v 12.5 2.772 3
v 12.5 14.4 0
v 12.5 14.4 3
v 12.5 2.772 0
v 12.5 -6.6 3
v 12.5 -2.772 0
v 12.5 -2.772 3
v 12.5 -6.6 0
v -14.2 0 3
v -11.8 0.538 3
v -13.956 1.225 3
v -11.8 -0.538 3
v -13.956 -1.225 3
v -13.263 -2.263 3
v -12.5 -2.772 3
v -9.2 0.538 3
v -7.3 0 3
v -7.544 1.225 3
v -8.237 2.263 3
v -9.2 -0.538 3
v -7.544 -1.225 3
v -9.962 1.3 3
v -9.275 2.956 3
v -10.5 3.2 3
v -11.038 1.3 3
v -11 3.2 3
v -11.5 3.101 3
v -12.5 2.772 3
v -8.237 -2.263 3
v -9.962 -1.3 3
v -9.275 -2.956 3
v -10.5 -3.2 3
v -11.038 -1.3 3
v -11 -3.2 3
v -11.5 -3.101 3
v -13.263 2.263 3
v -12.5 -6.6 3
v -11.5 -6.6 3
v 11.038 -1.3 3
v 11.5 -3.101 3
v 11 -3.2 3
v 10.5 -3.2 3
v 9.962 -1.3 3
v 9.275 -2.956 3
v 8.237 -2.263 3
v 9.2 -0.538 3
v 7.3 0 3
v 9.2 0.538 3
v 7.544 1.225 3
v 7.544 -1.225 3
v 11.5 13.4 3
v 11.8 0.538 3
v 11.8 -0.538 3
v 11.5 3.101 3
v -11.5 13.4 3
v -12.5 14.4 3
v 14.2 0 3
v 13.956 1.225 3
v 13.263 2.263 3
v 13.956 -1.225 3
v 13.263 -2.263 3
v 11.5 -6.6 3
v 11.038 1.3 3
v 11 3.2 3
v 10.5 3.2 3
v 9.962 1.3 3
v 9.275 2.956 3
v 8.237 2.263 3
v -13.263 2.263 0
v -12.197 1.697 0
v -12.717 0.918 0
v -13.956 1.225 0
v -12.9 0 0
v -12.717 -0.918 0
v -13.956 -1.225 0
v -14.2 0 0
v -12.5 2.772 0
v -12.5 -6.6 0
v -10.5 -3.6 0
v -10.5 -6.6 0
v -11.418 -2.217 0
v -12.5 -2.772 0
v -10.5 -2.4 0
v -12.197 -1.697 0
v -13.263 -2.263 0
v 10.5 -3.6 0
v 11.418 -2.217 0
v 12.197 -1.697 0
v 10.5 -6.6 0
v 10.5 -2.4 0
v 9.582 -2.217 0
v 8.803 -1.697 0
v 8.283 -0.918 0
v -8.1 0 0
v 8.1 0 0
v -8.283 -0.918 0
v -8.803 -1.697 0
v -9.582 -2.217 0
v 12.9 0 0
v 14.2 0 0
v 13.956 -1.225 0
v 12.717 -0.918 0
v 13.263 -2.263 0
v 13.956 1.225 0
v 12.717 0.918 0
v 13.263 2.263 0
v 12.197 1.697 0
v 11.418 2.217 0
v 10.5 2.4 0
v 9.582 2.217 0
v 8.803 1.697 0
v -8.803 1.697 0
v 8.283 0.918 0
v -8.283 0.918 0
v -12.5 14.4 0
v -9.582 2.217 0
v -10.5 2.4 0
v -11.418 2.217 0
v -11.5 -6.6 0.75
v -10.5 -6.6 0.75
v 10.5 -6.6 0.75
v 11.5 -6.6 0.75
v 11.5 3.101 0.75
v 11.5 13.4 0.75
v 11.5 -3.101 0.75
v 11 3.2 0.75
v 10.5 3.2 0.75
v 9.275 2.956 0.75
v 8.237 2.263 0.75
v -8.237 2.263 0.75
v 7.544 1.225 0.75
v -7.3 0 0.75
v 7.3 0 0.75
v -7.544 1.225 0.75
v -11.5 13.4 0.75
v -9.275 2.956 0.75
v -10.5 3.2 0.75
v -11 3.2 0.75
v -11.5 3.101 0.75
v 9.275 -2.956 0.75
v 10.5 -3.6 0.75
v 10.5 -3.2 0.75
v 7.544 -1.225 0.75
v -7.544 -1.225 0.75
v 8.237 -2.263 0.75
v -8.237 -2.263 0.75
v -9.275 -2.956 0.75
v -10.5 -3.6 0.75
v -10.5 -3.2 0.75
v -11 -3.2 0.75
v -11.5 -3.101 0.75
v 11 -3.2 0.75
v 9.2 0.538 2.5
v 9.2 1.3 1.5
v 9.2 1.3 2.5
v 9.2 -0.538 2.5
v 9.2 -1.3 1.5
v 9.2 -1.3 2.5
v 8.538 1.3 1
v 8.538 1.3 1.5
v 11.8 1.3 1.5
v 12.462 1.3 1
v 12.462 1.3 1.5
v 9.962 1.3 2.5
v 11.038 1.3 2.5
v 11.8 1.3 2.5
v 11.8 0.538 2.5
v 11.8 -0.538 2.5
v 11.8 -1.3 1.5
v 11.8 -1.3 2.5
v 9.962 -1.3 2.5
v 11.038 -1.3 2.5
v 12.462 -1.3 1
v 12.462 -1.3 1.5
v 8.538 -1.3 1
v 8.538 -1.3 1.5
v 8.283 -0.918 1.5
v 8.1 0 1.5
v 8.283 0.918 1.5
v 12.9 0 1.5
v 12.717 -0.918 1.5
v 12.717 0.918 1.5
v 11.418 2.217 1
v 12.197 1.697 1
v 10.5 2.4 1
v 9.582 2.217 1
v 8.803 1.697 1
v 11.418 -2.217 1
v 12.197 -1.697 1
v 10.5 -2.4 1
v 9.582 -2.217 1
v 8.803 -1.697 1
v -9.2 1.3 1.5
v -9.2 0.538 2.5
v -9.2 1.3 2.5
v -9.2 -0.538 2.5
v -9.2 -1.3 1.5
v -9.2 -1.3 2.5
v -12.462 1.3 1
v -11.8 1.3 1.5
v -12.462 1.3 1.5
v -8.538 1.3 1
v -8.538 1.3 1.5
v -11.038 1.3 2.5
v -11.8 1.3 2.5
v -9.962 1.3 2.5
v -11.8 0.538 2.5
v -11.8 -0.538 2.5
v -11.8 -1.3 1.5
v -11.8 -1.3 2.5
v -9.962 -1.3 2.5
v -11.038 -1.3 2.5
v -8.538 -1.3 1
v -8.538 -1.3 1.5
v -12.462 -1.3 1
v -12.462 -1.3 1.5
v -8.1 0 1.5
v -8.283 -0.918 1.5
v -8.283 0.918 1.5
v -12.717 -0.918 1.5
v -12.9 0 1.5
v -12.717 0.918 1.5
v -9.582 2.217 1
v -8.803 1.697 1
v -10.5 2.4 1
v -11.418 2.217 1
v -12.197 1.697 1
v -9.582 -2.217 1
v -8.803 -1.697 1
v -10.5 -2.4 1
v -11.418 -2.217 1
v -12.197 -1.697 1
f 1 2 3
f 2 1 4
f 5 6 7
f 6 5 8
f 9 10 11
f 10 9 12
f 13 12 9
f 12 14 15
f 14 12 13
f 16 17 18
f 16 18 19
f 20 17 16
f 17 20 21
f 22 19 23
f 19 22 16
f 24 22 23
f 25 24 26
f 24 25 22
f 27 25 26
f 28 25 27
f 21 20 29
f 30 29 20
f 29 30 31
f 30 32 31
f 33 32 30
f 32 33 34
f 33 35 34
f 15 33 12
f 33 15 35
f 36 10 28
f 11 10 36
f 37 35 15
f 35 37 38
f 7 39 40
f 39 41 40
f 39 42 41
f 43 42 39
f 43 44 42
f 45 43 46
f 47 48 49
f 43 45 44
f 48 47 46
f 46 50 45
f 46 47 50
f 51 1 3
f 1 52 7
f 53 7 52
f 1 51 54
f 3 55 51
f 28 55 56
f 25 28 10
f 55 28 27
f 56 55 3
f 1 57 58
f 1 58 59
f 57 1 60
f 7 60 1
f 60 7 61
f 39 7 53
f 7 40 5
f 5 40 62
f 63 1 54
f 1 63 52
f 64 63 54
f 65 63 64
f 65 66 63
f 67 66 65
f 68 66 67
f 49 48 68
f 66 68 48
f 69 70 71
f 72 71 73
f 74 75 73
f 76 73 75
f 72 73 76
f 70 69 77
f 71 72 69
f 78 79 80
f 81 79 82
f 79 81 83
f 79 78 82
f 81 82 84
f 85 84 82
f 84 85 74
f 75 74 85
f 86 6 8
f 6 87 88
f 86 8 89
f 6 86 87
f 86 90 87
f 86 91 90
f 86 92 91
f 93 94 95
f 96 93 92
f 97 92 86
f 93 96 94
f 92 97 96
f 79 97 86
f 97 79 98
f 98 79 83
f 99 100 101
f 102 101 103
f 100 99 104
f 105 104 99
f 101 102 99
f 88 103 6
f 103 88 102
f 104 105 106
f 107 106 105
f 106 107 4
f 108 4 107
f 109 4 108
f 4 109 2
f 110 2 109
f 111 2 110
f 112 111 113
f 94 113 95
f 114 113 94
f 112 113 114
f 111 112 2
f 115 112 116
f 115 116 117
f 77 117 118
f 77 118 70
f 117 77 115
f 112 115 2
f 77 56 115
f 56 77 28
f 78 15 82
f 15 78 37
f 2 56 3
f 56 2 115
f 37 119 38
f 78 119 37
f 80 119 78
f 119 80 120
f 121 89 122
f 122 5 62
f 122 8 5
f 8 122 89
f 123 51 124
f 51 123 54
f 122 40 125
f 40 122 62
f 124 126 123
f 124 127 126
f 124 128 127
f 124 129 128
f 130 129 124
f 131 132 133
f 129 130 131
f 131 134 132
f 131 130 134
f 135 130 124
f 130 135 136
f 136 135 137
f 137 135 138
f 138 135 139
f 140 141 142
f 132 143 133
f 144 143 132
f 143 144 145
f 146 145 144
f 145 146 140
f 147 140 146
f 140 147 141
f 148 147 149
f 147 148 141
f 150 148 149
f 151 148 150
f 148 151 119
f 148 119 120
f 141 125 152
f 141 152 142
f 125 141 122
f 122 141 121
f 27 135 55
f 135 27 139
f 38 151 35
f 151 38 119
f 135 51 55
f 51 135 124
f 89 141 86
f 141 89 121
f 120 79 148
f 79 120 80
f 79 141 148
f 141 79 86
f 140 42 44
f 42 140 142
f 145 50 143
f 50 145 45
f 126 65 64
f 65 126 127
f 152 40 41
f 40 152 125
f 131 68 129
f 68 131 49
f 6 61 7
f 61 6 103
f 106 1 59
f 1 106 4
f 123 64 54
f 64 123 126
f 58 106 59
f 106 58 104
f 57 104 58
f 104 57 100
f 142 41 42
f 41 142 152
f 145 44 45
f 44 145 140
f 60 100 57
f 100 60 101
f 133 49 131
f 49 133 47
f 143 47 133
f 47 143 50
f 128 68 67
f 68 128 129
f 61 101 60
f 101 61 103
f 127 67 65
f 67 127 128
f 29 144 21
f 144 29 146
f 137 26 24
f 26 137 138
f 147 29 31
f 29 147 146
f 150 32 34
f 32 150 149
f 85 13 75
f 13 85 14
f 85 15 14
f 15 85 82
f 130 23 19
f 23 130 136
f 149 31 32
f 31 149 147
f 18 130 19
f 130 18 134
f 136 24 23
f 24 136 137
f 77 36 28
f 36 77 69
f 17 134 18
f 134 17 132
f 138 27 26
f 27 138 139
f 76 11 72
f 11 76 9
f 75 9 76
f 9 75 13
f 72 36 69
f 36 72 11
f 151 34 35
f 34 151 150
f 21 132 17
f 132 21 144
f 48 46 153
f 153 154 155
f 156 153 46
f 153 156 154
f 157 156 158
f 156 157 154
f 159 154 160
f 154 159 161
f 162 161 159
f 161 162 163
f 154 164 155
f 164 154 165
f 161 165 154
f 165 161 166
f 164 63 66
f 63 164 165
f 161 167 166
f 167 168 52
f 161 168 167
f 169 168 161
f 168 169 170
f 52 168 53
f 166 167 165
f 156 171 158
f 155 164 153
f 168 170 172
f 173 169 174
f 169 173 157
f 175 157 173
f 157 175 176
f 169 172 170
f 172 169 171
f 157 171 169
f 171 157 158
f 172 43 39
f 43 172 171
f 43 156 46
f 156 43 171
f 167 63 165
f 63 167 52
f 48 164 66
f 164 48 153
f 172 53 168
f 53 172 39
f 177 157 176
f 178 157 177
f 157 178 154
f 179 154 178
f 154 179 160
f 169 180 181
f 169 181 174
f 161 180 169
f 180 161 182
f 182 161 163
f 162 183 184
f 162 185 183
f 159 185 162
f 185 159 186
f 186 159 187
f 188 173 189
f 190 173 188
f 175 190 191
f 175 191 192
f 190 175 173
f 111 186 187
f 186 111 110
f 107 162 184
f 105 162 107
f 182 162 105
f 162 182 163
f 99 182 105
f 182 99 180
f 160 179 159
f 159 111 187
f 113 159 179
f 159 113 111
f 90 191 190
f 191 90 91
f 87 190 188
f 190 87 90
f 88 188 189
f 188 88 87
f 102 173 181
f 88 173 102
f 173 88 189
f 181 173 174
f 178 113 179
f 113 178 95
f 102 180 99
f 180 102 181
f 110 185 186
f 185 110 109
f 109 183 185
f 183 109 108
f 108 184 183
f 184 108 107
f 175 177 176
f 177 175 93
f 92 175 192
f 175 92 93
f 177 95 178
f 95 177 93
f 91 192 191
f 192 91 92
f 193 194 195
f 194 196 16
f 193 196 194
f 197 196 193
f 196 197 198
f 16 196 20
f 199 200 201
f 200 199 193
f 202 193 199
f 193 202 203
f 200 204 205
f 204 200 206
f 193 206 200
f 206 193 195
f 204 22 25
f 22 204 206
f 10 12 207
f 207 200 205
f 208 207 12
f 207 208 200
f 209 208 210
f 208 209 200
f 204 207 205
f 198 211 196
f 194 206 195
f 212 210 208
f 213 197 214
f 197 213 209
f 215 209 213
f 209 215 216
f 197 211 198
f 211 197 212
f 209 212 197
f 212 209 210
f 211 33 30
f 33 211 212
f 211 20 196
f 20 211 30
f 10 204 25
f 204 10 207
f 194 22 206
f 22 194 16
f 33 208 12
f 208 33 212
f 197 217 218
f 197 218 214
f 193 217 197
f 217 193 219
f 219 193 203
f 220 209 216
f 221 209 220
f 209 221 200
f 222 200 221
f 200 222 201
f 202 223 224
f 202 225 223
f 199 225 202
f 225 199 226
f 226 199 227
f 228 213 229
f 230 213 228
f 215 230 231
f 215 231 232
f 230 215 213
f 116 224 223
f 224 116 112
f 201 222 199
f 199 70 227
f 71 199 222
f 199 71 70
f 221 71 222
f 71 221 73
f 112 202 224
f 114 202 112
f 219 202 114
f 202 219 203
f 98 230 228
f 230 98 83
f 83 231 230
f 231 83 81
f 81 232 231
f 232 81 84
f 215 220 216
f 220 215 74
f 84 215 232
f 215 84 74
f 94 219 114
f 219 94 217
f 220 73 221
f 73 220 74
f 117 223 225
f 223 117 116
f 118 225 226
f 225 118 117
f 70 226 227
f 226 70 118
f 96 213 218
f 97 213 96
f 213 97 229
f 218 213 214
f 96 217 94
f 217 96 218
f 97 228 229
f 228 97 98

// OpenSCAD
// file: libs/libdict.scad
// This library add dictionary like features to openscad
// the dictionary is a list of pairs as we cannot define new types.
// Unlike a python dictionary we cannot do a proper hash table for speed
// so everything is build around the OpenSCAD search function
// There are a lot of assert statements to ensure data in the "dictionary"
// is in the format of
// * A list of lists
// * Each internal list has a length of two
// * First element of each internal list is a string (the key)
// * All keys are unique.


// Private function:
// This function returns true if the value is in the list
// value must be a string.
// No error checking, for use by is_in only!
function _is_in_str(value, list) =
    search([value], list) != [[]];

// Private function:
// This function returns true if the value is in the list
// value must be a number.
// No error checking, for use by is_in only!
function _is_in_num(value, list) =
    search(value, list) != [];


// This function returns true if the value is in the list
// value must be a string or a number.
function is_in(value, list) =
    assert(is_num(value) || is_string(value) , "is_in: value must be a number or string")
    assert(is_list(list), "is_in: list must be a list")
    is_num(value) ? _is_in_num(value, list) : _is_in_str(value, list);

/**
 * Sum a list
 * This recursive function sums a list.  It should be called with one
 * argument (the list); the other two arguments simply allow it to be
 * "tail-recursive" which lets OpenSCAD optimise it better.  This is
 * very close to the example given in the OpenSCAD docs.
 */
function _libdict_sum_list(list, starting_element=0, running_total=0) =
    starting_element >= len(list) ?
        running_total :
        _libdict_sum_list(list, starting_element + 1, running_total + list[starting_element]);

/**
 * When checking a list for uniqueness, we can get "errant matches".
 * An errant match is when a non-list matches with the first element in a list.
 * i.e. it would consider [1, [1,0]] to be non-unique. We cannot know which 
 * element is the non-list but we do know that it is errant if exactly one 
 * of them is not a list.
 * If two elements are non-lists, they must be identical in order to have matched.  
 * Similarly, if all elements are lists, they must be identical because ``search`` 
 * will have matched them as whole lists.
 * The argument "list" is the list we are checking for uniqueness, and "match" is 
 * a vector of indices that have been returned by ``search``.
 */
function _check_errant_match(list, match) = let(
    non_list = [for (m = match) is_list(list[m])? 0 : 1],
    number_of_non_lists = _libdict_sum_list(non_list)
) number_of_non_lists == 1 ? 0 : 1;

// Returns true if all emements in list are unique.
function is_unique(list) =
    assert(is_list(list), "is_unique: list must be a list")
    let(
        matches = search(list, list, 0),
        // Assign 1 or 0 depending on is the match length for each element
        // return wether any matches are greater than one (mathcing more than
        // itself)
        // note cannot search for true or false so using 1 and zero
        bool_list = [for (match = matches) if (len(match)==1) 0
            // should put a 1 here to show they matched but in the case of
            // [1, [1]] it will match both, so need to check if they are
            // both lists or both not list
            else _check_errant_match(list, match)]
    ) !is_in(1, bool_list);

// Private function:
// Checks that the input is a list and that every element is a list
// of length 2.
// No error checking, for use by valid_dict only!
function _is_pairs(list) =
    !is_list(list) ? false :
        len(list)==0 ? false :
            !is_in(0, [for (pair = list) is_list(pair) && len(pair)==2 ? 1: 0]);

// Private function:
// Checks all elements in the list are strings
// No error checking, for use by valid_dict only!
// Strings can't be empty
function _is_list_of_strings(list) =
    !is_in(0, [for (item = list) is_string(item) && len(item)>0 ? 1: 0]);

// Private function:
// Returns the keus in a dictionary
// No error checking, for use by valid_dict only!
function _keylist(dict)  = [for (pair=dict) pair[0]];

function valid_dict(dict) =
    //if the input are not pairs return instantly
    !_is_pairs(dict) ? false : let (
        //if they are pairs get all keys
        keys = _keylist(dict),
        all_strings =  _is_list_of_strings(keys),
        unique = is_unique(keys)
    ) (all_strings && unique) ? true : false;

// Key lookup for key value pair "dictionary".
// Unlike the built in lookup this works with strings.
function key_lookup(key, dict) =
    assert(is_string(key), "`key` must be a string")
    assert(valid_dict(dict), "`dict` must be a valid 'dictionary'")
    let(
        // key is in [] because otherwise openscad will search for each letter rather than the string.
        index = search([key], dict, 1, 0)[0]
    )  assert (index!=[], "Key lookup failed, key not found!") dict[index][1];

// Creates a new dictionary with a key value pair replaced. Pair must already
// be in dictionary.
function replace_value(key, value, dict) =
    assert(is_string(key), "`key` must be a string")
    assert(valid_dict(dict), "`dict` must be a valid 'dictionary'")
    assert(is_in(key, _keylist(dict)), "`key` not found in dictionary!")
    [for (kv_pair = dict) key!=kv_pair[0] ? kv_pair : [key, value]];


// Creates a new dictionary with a a set of key value pair replaced
// both inputs must be a dictionary. All keys in input must already be
// in dictionary
function replace_multiple_values(rep_dict, dict) =
    assert(valid_dict(rep_dict), "`rep dict` must be a valid 'dictionary'")
    assert(valid_dict(dict), "`dict` must be a valid 'dictionary'")
    let(
        // loop over all keys in replacement dict checking they are in the original
        rep_keys = [for (key = _keylist(rep_dict))
            assert(is_in(key, _keylist(dict)), "`key` not found in dictionary!")
            key
        ]
    ) //Finally return the updated dictionary using this long list comprehension.
    [
        for (kv_pair = dict) let(
            key = kv_pair[0],
            // check if this key is in the replacement dictionary and if so return index
            // key is in [] because otherwise openscad will search for each letter rather
            // than the string.
            index = search([key], rep_dict, 1, 0)[0]
            // if index is empty return original key value pair, else return the key with
            // the replaced value
        ) index == [] ? kv_pair : [key, rep_dict[index][1]]
    ];
// main file
// this file just pulls out one module from picamera_2

use <./libs/cameras/picamera_2.scad>

picamera_2_cover();
